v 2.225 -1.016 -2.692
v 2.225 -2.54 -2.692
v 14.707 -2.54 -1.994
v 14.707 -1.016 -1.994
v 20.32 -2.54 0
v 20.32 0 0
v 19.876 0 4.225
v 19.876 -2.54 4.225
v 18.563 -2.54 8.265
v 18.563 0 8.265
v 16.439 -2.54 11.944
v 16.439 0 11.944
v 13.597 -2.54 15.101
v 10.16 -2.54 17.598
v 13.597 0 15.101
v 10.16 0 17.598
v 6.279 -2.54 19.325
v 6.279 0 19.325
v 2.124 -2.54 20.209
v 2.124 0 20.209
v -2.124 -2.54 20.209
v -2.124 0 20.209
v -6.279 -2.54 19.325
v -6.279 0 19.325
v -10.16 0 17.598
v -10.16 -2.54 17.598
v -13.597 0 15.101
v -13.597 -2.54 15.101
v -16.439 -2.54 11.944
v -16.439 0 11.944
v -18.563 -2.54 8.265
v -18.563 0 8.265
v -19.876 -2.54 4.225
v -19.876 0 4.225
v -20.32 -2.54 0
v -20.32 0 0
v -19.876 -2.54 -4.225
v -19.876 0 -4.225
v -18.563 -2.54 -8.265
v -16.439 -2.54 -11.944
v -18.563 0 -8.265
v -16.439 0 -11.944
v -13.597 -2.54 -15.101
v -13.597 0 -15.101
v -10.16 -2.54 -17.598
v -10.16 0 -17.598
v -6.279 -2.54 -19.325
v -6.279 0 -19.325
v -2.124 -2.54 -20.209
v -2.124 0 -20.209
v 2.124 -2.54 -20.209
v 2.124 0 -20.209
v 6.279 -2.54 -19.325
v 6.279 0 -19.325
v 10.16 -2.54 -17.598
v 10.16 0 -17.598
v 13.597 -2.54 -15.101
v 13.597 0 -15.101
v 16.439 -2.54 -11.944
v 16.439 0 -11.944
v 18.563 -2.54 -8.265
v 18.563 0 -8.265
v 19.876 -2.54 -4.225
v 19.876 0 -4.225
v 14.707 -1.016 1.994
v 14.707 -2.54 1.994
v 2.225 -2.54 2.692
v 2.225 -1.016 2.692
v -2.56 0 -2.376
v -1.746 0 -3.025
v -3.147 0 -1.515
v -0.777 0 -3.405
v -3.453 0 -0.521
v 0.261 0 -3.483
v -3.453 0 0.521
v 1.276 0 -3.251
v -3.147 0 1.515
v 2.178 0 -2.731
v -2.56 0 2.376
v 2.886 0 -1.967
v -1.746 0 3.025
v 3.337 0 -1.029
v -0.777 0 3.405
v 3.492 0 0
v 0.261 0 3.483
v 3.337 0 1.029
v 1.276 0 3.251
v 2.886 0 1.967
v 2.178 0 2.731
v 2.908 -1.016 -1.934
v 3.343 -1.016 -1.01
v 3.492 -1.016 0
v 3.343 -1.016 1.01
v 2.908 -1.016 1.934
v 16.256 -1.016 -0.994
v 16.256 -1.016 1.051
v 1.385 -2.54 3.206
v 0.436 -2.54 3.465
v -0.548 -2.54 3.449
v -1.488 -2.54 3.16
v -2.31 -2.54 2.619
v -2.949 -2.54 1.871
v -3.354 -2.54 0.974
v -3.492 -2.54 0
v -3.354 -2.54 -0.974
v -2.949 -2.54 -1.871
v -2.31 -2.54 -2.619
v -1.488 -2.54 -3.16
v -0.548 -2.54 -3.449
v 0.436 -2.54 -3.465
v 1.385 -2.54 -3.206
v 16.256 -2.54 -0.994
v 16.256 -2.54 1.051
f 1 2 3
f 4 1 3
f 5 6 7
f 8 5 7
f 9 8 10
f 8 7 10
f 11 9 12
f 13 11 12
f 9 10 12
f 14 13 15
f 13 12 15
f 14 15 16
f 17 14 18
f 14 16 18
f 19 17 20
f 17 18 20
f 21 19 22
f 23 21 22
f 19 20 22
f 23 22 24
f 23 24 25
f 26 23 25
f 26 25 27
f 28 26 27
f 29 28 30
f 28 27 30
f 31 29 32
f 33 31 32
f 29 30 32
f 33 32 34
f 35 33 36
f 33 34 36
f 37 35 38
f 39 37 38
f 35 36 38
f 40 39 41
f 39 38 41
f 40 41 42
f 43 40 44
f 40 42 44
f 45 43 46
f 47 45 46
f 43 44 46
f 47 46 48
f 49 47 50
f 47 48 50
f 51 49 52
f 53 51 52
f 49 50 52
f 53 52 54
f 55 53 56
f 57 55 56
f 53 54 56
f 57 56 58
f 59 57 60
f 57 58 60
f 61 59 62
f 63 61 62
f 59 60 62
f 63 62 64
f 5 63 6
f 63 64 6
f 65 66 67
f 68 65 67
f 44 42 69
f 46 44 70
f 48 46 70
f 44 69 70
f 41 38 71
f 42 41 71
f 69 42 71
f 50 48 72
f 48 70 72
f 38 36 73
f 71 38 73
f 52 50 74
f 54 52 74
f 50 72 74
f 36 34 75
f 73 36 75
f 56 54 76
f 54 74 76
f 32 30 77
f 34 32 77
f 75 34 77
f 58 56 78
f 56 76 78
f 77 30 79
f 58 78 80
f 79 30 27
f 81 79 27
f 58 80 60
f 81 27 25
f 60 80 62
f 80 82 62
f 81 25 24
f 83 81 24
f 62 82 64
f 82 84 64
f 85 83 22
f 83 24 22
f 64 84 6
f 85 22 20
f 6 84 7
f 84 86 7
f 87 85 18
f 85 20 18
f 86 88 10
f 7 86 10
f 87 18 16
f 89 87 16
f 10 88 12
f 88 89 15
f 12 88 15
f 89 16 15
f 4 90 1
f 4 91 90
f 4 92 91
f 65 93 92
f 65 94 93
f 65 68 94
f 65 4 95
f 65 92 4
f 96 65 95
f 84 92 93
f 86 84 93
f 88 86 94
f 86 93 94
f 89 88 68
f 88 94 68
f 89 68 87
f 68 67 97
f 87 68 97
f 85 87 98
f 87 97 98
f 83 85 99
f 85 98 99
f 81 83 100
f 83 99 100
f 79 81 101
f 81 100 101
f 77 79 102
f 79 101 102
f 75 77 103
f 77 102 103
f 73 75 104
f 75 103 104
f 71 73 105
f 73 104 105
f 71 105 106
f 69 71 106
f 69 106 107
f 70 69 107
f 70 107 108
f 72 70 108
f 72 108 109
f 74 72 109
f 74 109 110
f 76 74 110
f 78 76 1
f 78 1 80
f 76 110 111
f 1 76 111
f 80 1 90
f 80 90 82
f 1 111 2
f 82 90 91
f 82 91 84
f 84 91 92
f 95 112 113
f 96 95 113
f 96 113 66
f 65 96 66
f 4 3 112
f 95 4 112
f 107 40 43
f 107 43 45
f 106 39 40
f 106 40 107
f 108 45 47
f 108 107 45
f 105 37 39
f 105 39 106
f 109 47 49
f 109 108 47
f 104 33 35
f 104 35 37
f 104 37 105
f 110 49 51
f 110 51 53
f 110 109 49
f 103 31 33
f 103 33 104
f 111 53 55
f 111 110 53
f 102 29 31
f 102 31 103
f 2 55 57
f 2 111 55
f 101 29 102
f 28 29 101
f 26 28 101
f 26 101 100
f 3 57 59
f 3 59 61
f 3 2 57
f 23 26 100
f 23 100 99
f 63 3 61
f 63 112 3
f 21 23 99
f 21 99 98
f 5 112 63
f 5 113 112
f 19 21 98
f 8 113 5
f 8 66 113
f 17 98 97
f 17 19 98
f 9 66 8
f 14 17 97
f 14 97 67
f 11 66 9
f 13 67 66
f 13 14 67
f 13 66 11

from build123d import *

# Parameters (mm, degrees)
F0_R     = 20.32
F1_DEPTH = 2.54
F2_R     = 3.4925
F3_DEPTH = 25.4
F5_DEPTH = 1.524


with BuildPart() as f1:
    # F0 (on Front) → F1 (new body)
    with BuildSketch(Plane.XZ):
        Circle(F0_R)
    extrude(amount=F1_DEPTH)

    # F2 (on face) → F3 (cut)
    with BuildSketch(Plane.XZ.offset(2.54)):
        Circle(F2_R)
    extrude(amount=-F3_DEPTH, mode=Mode.SUBTRACT)

    # F4 (on face) → F5 (cut)
    with BuildSketch(Plane.XZ.offset(2.54)):
        Polygon((14.7066, 1.9939), (2.224531, 2.6924), (2.224531, -2.6924), (14.7066, -1.9939), (16.256, -0.993628), (16.256, 1.051273), align=None)
    extrude(amount=-F5_DEPTH, mode=Mode.SUBTRACT)


solid = f1.part
